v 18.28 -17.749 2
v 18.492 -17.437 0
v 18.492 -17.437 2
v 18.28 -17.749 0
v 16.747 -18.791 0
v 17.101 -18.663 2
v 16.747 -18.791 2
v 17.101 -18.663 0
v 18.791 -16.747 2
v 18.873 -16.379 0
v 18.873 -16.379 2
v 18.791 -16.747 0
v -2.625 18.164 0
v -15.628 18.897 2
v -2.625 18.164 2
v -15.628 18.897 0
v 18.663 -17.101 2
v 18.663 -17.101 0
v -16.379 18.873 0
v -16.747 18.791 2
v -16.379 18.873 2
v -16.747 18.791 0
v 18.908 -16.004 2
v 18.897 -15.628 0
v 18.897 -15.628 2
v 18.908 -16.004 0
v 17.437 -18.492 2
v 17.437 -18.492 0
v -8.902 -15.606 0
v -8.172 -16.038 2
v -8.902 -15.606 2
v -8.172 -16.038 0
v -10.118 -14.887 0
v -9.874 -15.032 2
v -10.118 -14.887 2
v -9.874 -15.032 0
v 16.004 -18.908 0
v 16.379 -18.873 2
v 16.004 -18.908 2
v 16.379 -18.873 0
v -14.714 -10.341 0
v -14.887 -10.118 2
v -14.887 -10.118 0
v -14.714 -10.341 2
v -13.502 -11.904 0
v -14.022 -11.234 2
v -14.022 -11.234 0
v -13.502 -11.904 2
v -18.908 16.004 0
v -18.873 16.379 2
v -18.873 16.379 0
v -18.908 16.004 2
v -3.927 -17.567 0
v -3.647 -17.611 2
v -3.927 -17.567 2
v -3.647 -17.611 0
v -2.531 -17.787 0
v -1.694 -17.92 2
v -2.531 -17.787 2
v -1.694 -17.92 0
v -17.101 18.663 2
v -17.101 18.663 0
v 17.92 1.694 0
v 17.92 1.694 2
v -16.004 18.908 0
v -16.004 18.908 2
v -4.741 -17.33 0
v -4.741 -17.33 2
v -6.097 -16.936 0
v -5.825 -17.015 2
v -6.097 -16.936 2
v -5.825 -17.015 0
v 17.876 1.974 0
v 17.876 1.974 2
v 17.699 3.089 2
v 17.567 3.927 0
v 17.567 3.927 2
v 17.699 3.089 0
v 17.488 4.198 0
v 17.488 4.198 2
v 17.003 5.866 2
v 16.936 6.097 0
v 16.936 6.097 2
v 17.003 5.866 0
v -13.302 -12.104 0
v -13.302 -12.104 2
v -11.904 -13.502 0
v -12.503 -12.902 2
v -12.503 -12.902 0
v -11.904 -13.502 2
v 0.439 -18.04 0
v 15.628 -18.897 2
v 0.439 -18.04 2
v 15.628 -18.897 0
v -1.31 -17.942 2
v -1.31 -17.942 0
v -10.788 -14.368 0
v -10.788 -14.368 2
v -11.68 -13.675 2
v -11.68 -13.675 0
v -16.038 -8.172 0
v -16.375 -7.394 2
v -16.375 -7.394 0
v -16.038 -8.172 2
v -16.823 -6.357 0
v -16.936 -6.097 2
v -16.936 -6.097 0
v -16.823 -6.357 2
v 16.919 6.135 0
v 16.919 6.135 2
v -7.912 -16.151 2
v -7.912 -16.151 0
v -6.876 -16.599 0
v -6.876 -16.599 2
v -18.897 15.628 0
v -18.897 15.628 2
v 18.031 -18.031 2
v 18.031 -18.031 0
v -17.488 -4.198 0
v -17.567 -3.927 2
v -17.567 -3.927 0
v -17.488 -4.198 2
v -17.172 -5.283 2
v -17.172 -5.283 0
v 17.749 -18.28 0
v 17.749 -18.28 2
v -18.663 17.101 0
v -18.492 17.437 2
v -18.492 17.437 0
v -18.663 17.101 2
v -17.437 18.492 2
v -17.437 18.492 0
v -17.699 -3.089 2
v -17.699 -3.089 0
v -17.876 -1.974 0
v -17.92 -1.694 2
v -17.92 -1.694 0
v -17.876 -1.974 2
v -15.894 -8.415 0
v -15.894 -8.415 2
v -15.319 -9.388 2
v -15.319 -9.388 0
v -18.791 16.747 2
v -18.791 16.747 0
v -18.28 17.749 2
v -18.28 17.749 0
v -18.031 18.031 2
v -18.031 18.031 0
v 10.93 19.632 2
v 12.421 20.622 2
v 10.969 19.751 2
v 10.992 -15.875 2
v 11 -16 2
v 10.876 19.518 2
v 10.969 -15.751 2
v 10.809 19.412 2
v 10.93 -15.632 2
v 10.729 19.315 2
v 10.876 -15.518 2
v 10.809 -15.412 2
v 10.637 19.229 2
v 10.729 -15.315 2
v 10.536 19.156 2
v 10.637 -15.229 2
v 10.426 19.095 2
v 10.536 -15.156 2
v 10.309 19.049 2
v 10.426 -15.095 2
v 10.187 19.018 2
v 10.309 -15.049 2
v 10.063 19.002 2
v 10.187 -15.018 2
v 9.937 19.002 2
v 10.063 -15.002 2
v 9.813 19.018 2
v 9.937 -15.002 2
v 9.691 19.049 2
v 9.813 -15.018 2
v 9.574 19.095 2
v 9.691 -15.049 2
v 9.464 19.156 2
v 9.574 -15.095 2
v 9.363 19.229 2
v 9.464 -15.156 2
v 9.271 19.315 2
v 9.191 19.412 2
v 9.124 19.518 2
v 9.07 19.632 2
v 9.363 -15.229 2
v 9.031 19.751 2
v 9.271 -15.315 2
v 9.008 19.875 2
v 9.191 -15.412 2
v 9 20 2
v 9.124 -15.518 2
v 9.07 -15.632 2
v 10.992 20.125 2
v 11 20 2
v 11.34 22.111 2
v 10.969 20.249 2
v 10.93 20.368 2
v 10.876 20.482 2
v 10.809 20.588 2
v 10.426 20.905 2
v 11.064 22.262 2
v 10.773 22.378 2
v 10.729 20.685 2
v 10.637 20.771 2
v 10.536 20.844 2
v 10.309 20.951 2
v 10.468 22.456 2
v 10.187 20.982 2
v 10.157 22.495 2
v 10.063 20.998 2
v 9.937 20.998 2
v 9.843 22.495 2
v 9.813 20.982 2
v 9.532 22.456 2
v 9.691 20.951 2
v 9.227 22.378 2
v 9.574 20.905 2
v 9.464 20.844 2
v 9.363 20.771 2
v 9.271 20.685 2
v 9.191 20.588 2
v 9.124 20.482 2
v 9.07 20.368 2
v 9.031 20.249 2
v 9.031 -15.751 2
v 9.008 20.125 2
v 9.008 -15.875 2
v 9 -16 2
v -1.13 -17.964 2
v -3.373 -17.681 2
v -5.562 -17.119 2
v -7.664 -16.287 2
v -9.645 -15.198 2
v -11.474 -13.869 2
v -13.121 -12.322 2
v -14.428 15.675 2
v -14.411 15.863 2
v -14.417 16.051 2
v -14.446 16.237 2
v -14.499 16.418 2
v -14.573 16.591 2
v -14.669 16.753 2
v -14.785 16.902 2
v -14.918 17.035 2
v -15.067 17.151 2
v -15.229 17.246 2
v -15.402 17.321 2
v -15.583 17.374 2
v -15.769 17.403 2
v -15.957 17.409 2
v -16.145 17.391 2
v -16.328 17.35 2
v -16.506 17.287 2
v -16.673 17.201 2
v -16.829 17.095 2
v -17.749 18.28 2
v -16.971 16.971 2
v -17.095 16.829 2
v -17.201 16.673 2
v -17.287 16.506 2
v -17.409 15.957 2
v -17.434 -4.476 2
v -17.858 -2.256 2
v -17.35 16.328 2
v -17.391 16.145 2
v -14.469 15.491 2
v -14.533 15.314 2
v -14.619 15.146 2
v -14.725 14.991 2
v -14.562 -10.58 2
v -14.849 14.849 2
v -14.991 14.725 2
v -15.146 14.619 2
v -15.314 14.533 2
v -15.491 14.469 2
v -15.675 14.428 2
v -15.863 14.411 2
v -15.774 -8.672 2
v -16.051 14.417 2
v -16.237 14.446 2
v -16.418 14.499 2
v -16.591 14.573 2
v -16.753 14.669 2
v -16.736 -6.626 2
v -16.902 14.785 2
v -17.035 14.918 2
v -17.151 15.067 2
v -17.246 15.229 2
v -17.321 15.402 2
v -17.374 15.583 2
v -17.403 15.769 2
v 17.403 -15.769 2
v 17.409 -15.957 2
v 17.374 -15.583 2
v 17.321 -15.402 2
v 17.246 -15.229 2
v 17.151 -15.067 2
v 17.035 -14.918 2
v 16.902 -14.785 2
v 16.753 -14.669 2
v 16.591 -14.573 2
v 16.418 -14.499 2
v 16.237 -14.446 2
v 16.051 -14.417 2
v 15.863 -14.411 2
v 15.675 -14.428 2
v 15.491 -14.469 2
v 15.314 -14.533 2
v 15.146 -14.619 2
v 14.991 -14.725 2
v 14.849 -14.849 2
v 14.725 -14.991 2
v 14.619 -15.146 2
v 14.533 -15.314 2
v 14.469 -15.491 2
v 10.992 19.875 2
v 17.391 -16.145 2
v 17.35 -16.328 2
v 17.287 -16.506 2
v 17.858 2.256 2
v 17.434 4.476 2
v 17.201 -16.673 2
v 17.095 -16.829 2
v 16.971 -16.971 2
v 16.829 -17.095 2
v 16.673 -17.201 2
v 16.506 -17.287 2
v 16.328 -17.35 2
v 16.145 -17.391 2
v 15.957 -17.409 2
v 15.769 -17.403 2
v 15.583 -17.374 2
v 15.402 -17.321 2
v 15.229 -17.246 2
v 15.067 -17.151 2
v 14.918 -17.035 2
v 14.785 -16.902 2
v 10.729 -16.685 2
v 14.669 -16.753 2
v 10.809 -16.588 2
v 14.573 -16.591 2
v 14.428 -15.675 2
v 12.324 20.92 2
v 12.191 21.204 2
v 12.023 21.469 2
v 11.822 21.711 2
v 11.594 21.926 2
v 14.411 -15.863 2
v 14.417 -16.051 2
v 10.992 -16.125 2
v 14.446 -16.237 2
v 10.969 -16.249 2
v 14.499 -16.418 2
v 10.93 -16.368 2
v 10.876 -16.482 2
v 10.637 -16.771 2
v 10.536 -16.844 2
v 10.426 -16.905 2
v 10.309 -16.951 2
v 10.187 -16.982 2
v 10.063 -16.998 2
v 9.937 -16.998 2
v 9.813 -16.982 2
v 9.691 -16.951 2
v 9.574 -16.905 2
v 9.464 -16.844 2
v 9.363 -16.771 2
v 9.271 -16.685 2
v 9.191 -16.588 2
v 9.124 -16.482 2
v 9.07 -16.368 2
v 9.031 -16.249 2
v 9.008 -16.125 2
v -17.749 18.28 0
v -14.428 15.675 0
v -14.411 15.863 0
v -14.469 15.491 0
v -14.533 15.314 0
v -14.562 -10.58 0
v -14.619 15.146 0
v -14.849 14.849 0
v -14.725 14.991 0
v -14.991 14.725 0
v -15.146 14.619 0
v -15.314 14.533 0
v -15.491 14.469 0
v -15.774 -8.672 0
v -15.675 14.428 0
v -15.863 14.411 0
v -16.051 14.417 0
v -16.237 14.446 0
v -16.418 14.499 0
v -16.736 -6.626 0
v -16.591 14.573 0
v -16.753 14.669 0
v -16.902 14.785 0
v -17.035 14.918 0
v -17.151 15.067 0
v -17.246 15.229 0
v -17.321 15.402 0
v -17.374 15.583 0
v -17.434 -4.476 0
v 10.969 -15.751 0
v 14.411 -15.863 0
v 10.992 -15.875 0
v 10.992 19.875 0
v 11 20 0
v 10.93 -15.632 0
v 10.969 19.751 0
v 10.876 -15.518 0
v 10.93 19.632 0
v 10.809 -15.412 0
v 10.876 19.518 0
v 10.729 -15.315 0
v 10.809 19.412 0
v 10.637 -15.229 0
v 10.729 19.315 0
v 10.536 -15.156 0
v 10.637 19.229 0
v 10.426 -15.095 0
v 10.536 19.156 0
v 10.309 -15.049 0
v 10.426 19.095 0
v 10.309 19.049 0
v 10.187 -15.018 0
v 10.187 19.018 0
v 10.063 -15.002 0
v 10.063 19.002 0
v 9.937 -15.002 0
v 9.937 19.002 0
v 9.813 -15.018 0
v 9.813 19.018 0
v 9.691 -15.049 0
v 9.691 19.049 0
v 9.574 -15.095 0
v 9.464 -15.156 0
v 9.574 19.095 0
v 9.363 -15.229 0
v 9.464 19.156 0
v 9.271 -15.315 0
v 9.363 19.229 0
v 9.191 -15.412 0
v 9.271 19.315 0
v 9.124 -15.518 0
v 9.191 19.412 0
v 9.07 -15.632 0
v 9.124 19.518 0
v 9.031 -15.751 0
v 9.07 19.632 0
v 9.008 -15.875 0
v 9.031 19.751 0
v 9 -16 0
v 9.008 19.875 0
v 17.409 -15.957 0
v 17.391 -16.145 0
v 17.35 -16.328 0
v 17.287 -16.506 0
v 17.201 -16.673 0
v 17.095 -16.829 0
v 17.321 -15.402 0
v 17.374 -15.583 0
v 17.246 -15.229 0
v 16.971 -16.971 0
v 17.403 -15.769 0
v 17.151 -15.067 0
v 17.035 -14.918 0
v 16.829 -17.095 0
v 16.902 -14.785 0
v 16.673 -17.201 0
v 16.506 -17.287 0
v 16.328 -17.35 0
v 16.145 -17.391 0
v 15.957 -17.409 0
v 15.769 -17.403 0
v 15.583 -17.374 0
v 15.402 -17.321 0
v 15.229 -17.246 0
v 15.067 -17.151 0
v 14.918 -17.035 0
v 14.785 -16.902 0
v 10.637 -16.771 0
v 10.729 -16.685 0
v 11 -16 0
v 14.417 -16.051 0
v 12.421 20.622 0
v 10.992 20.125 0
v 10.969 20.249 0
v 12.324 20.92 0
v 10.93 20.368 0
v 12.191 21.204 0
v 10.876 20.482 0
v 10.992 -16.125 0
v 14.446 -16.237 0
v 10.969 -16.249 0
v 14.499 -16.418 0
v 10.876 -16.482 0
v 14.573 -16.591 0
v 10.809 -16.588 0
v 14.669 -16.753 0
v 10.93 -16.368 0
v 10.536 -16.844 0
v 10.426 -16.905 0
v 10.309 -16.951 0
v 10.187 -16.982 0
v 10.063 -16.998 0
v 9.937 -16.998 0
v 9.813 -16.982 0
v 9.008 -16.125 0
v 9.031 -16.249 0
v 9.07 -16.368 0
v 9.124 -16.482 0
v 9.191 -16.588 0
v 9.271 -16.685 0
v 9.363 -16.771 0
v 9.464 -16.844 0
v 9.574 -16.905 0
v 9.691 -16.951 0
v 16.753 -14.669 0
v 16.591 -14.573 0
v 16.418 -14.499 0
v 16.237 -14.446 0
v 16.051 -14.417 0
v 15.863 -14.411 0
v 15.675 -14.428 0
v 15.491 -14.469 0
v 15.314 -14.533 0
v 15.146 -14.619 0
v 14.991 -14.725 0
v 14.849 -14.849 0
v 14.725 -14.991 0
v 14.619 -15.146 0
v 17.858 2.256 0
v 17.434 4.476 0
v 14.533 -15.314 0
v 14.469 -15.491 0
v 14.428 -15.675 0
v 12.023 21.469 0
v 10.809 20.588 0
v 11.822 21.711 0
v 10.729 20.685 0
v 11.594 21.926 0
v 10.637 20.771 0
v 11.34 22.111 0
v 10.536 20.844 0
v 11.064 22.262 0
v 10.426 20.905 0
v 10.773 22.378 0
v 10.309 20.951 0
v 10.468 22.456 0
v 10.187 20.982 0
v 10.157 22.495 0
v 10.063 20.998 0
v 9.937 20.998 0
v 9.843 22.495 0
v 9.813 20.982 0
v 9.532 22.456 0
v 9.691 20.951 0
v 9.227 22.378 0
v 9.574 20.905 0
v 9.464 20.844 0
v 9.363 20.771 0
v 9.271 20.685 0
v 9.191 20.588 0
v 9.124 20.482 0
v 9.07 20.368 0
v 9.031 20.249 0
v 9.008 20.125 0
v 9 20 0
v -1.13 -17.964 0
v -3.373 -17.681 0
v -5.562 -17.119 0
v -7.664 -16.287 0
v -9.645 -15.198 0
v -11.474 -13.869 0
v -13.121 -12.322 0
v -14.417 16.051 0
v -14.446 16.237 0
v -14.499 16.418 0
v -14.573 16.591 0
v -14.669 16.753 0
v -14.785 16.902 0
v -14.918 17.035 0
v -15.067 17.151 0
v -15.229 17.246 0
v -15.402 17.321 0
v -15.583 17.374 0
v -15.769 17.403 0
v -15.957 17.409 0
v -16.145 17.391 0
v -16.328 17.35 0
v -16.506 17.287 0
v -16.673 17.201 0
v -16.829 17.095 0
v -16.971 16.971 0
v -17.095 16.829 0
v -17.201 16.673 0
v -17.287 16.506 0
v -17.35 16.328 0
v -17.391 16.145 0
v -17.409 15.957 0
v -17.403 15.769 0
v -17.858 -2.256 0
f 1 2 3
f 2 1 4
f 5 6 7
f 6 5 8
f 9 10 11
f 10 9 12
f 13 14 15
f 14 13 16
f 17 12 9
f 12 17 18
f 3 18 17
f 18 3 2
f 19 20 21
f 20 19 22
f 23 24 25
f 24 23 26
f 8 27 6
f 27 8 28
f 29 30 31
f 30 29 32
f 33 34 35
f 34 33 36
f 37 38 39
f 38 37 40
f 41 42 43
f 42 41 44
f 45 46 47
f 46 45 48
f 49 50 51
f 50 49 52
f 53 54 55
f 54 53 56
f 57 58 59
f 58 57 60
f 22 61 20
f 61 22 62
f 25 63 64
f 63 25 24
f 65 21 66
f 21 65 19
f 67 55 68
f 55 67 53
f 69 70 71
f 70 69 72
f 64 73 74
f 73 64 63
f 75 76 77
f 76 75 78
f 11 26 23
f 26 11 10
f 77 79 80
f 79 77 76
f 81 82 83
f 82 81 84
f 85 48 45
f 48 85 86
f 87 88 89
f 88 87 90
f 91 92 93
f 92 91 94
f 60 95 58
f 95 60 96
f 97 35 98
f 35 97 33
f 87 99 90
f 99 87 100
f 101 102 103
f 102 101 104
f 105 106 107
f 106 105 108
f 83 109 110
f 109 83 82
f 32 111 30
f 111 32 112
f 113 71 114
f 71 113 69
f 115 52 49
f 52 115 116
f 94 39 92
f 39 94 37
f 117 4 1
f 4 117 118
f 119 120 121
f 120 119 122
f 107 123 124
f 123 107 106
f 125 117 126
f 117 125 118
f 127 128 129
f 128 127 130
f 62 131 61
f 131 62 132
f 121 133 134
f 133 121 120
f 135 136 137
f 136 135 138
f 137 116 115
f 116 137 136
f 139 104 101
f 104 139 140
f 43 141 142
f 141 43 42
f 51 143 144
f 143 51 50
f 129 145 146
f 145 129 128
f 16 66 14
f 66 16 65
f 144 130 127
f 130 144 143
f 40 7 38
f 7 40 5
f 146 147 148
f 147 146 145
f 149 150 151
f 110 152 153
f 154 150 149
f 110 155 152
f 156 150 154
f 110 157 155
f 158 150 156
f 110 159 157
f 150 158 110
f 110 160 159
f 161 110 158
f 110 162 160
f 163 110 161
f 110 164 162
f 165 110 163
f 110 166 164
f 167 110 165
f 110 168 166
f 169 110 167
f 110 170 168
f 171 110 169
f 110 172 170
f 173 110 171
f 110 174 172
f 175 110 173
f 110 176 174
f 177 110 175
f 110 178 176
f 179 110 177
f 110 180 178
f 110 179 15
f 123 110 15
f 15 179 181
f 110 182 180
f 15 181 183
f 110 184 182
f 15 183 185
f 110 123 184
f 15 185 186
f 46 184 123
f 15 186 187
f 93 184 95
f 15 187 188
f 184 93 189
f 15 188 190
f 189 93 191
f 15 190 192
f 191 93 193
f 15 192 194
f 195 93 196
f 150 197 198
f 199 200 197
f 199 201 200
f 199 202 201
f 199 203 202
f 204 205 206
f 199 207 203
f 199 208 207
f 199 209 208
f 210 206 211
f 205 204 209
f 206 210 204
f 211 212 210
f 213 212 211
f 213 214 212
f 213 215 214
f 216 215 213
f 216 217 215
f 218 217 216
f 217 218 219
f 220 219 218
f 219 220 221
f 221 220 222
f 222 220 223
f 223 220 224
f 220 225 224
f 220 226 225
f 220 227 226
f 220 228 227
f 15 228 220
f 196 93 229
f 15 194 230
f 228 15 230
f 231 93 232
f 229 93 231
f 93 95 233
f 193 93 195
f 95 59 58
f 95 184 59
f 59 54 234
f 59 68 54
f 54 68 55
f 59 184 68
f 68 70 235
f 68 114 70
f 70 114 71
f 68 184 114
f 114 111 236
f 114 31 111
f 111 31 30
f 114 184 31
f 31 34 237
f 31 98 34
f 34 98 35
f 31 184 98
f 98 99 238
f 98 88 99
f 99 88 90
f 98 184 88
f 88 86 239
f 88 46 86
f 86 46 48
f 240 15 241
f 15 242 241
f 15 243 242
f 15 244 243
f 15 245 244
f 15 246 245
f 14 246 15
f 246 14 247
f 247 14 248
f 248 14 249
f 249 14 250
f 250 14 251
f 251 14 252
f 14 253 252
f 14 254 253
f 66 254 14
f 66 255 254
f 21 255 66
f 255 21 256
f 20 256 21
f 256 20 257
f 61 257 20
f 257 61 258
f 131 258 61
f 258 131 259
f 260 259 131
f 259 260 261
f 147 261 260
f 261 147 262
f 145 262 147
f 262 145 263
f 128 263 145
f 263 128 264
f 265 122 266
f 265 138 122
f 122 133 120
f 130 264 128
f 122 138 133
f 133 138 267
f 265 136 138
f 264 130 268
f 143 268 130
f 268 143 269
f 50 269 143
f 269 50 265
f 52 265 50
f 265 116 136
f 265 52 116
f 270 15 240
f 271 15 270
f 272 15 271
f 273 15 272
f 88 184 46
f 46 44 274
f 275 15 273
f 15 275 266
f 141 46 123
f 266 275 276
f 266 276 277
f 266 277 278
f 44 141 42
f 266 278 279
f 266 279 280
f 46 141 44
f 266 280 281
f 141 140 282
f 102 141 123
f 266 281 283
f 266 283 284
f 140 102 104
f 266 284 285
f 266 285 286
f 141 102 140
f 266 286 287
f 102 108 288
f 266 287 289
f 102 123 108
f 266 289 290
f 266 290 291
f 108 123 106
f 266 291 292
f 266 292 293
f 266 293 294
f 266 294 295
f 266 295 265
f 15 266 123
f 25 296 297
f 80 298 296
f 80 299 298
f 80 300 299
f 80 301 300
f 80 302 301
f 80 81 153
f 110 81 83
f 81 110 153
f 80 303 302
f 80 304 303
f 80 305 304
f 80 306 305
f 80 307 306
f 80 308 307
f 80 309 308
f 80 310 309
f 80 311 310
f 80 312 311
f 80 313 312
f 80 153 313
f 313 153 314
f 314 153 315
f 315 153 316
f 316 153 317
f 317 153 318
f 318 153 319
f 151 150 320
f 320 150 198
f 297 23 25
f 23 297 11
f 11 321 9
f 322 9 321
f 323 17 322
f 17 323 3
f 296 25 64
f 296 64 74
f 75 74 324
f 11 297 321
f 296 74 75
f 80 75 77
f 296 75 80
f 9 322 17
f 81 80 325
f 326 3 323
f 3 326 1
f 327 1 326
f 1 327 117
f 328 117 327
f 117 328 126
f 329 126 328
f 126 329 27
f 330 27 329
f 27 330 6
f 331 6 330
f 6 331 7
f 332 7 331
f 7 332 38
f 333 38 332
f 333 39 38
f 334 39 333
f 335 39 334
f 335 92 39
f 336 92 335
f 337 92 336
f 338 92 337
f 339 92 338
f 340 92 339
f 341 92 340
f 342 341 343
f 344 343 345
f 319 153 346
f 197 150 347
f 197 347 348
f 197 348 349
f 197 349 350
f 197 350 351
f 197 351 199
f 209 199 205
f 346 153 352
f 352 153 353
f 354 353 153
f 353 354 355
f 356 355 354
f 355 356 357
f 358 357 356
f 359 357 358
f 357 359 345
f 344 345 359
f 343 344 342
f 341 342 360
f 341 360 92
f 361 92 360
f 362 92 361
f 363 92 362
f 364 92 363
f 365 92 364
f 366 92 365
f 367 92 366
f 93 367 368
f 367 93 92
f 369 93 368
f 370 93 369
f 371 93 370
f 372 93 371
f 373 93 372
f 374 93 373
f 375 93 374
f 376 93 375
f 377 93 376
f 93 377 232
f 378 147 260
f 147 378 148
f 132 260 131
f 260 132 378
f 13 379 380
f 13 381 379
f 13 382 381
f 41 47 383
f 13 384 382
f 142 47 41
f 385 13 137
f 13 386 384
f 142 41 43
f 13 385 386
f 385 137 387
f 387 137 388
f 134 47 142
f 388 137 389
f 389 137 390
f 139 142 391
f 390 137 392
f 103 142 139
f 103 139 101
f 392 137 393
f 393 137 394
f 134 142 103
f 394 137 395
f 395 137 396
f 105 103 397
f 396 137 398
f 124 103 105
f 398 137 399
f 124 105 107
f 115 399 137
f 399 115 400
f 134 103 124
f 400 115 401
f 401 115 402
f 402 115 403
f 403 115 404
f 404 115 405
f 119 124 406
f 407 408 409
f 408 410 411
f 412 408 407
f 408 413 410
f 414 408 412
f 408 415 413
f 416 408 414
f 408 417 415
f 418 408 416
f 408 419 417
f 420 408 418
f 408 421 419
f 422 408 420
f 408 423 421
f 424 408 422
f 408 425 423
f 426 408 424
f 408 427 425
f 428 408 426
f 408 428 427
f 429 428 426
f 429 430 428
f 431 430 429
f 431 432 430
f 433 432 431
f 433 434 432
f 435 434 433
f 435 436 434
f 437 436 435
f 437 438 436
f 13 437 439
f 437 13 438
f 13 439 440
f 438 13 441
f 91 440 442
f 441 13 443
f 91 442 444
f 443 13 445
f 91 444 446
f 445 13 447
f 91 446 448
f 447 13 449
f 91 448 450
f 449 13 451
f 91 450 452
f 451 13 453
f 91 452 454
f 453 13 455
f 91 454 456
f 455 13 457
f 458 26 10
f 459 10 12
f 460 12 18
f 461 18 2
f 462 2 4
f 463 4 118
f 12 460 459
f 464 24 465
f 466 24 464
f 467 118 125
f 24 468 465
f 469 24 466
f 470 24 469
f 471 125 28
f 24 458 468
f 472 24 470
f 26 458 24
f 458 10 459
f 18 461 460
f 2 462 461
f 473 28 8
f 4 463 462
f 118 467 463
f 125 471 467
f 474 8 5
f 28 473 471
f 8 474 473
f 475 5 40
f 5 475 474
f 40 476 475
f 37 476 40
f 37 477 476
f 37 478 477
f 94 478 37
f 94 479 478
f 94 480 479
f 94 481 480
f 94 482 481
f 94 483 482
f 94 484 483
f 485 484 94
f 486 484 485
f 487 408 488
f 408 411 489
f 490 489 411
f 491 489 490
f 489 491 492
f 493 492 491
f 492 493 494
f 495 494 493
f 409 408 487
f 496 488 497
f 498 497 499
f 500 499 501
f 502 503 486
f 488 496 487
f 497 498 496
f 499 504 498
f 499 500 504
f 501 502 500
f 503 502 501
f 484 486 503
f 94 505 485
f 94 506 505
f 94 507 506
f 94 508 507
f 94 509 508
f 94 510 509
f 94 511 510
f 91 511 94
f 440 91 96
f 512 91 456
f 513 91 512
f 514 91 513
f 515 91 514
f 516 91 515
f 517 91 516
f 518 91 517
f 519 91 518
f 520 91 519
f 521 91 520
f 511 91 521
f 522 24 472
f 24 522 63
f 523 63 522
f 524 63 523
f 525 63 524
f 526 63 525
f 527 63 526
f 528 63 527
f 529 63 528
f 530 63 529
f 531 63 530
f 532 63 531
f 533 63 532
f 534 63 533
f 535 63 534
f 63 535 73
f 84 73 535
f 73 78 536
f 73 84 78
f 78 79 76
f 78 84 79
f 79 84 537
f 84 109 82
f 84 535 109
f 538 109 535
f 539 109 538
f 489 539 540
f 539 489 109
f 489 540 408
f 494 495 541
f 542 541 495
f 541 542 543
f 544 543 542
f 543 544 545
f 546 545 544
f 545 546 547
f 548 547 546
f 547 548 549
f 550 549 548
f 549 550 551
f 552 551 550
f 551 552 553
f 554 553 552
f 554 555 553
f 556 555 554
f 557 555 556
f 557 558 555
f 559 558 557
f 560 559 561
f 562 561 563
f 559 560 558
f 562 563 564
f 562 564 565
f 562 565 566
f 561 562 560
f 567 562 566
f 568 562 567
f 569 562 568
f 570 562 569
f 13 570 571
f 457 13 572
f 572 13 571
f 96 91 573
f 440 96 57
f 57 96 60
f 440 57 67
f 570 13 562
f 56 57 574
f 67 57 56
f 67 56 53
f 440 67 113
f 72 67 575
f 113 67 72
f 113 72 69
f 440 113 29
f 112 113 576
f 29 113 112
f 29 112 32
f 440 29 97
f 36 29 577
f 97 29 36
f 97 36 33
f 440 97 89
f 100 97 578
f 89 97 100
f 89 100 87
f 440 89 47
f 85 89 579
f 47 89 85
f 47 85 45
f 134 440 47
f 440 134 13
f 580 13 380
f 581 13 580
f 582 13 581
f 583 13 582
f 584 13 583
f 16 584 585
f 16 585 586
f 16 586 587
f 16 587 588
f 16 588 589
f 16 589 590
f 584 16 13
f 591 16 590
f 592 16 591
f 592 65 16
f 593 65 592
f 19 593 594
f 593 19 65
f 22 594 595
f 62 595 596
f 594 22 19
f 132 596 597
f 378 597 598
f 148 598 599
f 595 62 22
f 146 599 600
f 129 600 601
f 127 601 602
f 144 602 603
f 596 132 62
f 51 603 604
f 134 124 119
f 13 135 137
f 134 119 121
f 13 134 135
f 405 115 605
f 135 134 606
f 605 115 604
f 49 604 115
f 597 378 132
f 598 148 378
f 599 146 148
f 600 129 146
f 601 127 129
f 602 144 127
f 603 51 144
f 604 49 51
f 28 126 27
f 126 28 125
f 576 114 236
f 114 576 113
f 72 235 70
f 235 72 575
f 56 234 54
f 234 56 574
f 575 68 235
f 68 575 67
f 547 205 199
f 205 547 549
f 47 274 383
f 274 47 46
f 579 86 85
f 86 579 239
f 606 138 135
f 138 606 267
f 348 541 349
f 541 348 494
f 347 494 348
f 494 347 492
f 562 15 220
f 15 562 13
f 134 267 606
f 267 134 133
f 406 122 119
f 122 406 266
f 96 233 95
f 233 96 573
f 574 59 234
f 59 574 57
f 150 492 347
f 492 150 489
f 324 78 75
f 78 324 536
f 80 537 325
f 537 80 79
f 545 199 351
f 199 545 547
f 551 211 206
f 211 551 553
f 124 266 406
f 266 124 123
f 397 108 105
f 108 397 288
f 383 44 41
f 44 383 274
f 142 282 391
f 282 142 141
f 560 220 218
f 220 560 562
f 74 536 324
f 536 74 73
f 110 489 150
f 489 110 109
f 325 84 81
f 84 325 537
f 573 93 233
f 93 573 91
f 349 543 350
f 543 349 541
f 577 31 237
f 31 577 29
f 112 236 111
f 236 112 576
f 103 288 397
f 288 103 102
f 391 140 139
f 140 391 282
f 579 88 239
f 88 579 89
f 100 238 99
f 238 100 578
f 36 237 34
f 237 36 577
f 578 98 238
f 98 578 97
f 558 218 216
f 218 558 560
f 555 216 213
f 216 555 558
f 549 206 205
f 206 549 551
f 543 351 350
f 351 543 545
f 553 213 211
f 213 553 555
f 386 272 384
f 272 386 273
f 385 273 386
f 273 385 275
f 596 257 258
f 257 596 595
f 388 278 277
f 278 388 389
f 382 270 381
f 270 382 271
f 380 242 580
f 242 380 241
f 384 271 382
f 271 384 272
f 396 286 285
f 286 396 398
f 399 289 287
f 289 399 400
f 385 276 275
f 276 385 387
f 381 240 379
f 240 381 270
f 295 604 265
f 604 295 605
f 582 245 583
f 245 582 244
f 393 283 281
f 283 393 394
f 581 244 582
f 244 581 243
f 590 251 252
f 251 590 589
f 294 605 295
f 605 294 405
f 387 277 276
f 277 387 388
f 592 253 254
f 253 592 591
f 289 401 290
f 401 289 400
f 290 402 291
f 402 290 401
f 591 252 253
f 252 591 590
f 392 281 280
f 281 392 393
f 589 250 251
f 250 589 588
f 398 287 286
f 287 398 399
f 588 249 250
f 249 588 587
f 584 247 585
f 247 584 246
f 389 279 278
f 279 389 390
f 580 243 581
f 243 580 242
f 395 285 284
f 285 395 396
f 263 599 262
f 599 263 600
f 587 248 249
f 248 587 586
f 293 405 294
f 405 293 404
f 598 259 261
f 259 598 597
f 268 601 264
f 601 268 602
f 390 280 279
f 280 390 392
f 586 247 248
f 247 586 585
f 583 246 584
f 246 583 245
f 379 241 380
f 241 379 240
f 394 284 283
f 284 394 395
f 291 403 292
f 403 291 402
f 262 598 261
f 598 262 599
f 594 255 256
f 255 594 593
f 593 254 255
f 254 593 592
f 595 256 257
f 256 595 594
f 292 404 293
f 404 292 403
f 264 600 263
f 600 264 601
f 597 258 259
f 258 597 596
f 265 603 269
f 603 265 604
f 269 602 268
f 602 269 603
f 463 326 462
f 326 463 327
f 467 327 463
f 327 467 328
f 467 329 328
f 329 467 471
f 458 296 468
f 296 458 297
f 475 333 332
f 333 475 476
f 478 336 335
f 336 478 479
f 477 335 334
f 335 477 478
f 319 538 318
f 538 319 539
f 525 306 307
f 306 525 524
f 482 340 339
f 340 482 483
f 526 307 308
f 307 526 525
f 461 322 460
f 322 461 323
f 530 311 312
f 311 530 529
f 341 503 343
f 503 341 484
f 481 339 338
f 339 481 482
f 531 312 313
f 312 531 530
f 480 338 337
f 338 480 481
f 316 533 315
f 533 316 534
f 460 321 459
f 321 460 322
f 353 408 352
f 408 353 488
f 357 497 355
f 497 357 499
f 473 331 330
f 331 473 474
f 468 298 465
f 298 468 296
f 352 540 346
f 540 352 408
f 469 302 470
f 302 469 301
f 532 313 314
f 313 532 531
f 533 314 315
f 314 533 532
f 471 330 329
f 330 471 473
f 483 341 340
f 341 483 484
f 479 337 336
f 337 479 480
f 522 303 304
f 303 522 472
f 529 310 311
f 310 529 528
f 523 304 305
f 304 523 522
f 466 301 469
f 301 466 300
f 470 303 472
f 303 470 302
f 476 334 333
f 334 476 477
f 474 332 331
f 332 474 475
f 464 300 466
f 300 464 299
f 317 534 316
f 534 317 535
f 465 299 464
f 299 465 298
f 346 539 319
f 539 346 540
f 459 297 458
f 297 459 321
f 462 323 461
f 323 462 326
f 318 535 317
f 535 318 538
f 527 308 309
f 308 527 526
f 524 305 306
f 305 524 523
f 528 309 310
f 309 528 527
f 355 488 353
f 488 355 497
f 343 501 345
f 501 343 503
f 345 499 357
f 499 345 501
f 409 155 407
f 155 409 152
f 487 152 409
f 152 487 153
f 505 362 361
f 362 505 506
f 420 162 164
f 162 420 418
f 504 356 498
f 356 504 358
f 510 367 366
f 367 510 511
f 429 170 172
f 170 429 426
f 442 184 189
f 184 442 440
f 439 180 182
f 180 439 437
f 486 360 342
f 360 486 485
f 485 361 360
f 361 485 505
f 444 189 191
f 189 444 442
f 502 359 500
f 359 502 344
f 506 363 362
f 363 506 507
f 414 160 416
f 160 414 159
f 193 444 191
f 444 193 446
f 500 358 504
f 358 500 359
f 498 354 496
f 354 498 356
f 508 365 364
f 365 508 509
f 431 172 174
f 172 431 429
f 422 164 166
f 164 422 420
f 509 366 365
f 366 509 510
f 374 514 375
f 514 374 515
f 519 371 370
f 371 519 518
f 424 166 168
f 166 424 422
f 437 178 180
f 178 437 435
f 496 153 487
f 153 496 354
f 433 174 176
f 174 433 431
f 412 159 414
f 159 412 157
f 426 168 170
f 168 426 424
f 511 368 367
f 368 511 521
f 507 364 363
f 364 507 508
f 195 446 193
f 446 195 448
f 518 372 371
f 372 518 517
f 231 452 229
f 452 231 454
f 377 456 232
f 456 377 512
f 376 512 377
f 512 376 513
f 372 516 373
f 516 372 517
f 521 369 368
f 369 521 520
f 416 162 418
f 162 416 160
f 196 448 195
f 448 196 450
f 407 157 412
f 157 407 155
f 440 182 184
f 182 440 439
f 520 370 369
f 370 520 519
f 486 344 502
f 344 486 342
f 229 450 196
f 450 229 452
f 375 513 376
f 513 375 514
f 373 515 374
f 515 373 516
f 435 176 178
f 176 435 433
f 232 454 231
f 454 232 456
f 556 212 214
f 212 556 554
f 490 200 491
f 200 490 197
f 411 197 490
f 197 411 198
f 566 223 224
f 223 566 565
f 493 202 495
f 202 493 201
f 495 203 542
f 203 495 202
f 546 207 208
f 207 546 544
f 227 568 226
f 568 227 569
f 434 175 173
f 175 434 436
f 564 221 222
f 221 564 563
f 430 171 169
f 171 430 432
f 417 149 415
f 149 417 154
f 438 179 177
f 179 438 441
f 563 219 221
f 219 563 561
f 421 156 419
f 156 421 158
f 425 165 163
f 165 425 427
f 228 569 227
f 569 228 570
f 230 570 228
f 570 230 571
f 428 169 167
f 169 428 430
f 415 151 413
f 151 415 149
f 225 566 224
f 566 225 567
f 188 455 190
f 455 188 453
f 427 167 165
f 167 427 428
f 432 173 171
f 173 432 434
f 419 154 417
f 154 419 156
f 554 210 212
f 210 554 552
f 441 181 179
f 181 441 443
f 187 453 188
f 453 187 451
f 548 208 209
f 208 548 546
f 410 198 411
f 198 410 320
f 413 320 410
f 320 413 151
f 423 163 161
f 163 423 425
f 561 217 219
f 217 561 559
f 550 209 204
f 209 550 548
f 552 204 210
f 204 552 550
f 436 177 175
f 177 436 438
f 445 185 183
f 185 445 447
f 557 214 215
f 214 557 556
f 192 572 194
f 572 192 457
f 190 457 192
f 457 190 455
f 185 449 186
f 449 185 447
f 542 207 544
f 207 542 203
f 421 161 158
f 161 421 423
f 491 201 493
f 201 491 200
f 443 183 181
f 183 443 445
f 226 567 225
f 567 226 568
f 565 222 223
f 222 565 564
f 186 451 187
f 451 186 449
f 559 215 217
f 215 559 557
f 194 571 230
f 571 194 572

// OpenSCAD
MOUNT_HOLE_SPACING = 36;
MOUNT_HOLE_DIA = 2;
MOUNT_HOLE_HEAD_DIA = 5;
MOUNT_HOLE_OFFSET_X = 10;
MOUNT_HOLE_OFFSET_Y = 2;

THICKNESS = 2;

MOTOR_HOLE_SPACING = 45;
MOTOR_HOLE_DIA = 3;
MOTOR_HOLE_HEAD_DIA = 6;
MOTOR_HOLE_ANGLE = -45;

MOTOR_DIA = 36;

$fn = 50;

module body() {
  rotate([0, 0, MOTOR_HOLE_ANGLE])
  hull() {
    for(i = [-1, 1]) {
      translate([i * MOTOR_HOLE_SPACING/2, 0, 0,])
      cylinder(d = MOTOR_HOLE_HEAD_DIA, h = THICKNESS);

      cylinder(d = MOTOR_DIA, h = THICKNESS);
    }
  }
  hull() {
    for(i = [-1, 1]) {
      translate([MOUNT_HOLE_OFFSET_X, i * MOUNT_HOLE_SPACING/2 + MOUNT_HOLE_OFFSET_Y, 0,])
      cylinder(d = MOUNT_HOLE_HEAD_DIA, h = THICKNESS);

      cylinder(d = MOTOR_DIA, h = THICKNESS);
    }
  }
}
module holes() {
  rotate([0, 0, MOTOR_HOLE_ANGLE])
  for(i = [-1, 1]) {
    translate([i * MOTOR_HOLE_SPACING/2, 0, 0,])
    cylinder(d = MOTOR_HOLE_DIA, h = THICKNESS);
  }
  for(i = [-1, 1]) {
    translate([MOUNT_HOLE_OFFSET_X, i * MOUNT_HOLE_SPACING/2 + MOUNT_HOLE_OFFSET_Y, 0,])
    cylinder(d = MOUNT_HOLE_DIA, h = THICKNESS);
  }
}
difference() {
  body();
  #holes();
}
